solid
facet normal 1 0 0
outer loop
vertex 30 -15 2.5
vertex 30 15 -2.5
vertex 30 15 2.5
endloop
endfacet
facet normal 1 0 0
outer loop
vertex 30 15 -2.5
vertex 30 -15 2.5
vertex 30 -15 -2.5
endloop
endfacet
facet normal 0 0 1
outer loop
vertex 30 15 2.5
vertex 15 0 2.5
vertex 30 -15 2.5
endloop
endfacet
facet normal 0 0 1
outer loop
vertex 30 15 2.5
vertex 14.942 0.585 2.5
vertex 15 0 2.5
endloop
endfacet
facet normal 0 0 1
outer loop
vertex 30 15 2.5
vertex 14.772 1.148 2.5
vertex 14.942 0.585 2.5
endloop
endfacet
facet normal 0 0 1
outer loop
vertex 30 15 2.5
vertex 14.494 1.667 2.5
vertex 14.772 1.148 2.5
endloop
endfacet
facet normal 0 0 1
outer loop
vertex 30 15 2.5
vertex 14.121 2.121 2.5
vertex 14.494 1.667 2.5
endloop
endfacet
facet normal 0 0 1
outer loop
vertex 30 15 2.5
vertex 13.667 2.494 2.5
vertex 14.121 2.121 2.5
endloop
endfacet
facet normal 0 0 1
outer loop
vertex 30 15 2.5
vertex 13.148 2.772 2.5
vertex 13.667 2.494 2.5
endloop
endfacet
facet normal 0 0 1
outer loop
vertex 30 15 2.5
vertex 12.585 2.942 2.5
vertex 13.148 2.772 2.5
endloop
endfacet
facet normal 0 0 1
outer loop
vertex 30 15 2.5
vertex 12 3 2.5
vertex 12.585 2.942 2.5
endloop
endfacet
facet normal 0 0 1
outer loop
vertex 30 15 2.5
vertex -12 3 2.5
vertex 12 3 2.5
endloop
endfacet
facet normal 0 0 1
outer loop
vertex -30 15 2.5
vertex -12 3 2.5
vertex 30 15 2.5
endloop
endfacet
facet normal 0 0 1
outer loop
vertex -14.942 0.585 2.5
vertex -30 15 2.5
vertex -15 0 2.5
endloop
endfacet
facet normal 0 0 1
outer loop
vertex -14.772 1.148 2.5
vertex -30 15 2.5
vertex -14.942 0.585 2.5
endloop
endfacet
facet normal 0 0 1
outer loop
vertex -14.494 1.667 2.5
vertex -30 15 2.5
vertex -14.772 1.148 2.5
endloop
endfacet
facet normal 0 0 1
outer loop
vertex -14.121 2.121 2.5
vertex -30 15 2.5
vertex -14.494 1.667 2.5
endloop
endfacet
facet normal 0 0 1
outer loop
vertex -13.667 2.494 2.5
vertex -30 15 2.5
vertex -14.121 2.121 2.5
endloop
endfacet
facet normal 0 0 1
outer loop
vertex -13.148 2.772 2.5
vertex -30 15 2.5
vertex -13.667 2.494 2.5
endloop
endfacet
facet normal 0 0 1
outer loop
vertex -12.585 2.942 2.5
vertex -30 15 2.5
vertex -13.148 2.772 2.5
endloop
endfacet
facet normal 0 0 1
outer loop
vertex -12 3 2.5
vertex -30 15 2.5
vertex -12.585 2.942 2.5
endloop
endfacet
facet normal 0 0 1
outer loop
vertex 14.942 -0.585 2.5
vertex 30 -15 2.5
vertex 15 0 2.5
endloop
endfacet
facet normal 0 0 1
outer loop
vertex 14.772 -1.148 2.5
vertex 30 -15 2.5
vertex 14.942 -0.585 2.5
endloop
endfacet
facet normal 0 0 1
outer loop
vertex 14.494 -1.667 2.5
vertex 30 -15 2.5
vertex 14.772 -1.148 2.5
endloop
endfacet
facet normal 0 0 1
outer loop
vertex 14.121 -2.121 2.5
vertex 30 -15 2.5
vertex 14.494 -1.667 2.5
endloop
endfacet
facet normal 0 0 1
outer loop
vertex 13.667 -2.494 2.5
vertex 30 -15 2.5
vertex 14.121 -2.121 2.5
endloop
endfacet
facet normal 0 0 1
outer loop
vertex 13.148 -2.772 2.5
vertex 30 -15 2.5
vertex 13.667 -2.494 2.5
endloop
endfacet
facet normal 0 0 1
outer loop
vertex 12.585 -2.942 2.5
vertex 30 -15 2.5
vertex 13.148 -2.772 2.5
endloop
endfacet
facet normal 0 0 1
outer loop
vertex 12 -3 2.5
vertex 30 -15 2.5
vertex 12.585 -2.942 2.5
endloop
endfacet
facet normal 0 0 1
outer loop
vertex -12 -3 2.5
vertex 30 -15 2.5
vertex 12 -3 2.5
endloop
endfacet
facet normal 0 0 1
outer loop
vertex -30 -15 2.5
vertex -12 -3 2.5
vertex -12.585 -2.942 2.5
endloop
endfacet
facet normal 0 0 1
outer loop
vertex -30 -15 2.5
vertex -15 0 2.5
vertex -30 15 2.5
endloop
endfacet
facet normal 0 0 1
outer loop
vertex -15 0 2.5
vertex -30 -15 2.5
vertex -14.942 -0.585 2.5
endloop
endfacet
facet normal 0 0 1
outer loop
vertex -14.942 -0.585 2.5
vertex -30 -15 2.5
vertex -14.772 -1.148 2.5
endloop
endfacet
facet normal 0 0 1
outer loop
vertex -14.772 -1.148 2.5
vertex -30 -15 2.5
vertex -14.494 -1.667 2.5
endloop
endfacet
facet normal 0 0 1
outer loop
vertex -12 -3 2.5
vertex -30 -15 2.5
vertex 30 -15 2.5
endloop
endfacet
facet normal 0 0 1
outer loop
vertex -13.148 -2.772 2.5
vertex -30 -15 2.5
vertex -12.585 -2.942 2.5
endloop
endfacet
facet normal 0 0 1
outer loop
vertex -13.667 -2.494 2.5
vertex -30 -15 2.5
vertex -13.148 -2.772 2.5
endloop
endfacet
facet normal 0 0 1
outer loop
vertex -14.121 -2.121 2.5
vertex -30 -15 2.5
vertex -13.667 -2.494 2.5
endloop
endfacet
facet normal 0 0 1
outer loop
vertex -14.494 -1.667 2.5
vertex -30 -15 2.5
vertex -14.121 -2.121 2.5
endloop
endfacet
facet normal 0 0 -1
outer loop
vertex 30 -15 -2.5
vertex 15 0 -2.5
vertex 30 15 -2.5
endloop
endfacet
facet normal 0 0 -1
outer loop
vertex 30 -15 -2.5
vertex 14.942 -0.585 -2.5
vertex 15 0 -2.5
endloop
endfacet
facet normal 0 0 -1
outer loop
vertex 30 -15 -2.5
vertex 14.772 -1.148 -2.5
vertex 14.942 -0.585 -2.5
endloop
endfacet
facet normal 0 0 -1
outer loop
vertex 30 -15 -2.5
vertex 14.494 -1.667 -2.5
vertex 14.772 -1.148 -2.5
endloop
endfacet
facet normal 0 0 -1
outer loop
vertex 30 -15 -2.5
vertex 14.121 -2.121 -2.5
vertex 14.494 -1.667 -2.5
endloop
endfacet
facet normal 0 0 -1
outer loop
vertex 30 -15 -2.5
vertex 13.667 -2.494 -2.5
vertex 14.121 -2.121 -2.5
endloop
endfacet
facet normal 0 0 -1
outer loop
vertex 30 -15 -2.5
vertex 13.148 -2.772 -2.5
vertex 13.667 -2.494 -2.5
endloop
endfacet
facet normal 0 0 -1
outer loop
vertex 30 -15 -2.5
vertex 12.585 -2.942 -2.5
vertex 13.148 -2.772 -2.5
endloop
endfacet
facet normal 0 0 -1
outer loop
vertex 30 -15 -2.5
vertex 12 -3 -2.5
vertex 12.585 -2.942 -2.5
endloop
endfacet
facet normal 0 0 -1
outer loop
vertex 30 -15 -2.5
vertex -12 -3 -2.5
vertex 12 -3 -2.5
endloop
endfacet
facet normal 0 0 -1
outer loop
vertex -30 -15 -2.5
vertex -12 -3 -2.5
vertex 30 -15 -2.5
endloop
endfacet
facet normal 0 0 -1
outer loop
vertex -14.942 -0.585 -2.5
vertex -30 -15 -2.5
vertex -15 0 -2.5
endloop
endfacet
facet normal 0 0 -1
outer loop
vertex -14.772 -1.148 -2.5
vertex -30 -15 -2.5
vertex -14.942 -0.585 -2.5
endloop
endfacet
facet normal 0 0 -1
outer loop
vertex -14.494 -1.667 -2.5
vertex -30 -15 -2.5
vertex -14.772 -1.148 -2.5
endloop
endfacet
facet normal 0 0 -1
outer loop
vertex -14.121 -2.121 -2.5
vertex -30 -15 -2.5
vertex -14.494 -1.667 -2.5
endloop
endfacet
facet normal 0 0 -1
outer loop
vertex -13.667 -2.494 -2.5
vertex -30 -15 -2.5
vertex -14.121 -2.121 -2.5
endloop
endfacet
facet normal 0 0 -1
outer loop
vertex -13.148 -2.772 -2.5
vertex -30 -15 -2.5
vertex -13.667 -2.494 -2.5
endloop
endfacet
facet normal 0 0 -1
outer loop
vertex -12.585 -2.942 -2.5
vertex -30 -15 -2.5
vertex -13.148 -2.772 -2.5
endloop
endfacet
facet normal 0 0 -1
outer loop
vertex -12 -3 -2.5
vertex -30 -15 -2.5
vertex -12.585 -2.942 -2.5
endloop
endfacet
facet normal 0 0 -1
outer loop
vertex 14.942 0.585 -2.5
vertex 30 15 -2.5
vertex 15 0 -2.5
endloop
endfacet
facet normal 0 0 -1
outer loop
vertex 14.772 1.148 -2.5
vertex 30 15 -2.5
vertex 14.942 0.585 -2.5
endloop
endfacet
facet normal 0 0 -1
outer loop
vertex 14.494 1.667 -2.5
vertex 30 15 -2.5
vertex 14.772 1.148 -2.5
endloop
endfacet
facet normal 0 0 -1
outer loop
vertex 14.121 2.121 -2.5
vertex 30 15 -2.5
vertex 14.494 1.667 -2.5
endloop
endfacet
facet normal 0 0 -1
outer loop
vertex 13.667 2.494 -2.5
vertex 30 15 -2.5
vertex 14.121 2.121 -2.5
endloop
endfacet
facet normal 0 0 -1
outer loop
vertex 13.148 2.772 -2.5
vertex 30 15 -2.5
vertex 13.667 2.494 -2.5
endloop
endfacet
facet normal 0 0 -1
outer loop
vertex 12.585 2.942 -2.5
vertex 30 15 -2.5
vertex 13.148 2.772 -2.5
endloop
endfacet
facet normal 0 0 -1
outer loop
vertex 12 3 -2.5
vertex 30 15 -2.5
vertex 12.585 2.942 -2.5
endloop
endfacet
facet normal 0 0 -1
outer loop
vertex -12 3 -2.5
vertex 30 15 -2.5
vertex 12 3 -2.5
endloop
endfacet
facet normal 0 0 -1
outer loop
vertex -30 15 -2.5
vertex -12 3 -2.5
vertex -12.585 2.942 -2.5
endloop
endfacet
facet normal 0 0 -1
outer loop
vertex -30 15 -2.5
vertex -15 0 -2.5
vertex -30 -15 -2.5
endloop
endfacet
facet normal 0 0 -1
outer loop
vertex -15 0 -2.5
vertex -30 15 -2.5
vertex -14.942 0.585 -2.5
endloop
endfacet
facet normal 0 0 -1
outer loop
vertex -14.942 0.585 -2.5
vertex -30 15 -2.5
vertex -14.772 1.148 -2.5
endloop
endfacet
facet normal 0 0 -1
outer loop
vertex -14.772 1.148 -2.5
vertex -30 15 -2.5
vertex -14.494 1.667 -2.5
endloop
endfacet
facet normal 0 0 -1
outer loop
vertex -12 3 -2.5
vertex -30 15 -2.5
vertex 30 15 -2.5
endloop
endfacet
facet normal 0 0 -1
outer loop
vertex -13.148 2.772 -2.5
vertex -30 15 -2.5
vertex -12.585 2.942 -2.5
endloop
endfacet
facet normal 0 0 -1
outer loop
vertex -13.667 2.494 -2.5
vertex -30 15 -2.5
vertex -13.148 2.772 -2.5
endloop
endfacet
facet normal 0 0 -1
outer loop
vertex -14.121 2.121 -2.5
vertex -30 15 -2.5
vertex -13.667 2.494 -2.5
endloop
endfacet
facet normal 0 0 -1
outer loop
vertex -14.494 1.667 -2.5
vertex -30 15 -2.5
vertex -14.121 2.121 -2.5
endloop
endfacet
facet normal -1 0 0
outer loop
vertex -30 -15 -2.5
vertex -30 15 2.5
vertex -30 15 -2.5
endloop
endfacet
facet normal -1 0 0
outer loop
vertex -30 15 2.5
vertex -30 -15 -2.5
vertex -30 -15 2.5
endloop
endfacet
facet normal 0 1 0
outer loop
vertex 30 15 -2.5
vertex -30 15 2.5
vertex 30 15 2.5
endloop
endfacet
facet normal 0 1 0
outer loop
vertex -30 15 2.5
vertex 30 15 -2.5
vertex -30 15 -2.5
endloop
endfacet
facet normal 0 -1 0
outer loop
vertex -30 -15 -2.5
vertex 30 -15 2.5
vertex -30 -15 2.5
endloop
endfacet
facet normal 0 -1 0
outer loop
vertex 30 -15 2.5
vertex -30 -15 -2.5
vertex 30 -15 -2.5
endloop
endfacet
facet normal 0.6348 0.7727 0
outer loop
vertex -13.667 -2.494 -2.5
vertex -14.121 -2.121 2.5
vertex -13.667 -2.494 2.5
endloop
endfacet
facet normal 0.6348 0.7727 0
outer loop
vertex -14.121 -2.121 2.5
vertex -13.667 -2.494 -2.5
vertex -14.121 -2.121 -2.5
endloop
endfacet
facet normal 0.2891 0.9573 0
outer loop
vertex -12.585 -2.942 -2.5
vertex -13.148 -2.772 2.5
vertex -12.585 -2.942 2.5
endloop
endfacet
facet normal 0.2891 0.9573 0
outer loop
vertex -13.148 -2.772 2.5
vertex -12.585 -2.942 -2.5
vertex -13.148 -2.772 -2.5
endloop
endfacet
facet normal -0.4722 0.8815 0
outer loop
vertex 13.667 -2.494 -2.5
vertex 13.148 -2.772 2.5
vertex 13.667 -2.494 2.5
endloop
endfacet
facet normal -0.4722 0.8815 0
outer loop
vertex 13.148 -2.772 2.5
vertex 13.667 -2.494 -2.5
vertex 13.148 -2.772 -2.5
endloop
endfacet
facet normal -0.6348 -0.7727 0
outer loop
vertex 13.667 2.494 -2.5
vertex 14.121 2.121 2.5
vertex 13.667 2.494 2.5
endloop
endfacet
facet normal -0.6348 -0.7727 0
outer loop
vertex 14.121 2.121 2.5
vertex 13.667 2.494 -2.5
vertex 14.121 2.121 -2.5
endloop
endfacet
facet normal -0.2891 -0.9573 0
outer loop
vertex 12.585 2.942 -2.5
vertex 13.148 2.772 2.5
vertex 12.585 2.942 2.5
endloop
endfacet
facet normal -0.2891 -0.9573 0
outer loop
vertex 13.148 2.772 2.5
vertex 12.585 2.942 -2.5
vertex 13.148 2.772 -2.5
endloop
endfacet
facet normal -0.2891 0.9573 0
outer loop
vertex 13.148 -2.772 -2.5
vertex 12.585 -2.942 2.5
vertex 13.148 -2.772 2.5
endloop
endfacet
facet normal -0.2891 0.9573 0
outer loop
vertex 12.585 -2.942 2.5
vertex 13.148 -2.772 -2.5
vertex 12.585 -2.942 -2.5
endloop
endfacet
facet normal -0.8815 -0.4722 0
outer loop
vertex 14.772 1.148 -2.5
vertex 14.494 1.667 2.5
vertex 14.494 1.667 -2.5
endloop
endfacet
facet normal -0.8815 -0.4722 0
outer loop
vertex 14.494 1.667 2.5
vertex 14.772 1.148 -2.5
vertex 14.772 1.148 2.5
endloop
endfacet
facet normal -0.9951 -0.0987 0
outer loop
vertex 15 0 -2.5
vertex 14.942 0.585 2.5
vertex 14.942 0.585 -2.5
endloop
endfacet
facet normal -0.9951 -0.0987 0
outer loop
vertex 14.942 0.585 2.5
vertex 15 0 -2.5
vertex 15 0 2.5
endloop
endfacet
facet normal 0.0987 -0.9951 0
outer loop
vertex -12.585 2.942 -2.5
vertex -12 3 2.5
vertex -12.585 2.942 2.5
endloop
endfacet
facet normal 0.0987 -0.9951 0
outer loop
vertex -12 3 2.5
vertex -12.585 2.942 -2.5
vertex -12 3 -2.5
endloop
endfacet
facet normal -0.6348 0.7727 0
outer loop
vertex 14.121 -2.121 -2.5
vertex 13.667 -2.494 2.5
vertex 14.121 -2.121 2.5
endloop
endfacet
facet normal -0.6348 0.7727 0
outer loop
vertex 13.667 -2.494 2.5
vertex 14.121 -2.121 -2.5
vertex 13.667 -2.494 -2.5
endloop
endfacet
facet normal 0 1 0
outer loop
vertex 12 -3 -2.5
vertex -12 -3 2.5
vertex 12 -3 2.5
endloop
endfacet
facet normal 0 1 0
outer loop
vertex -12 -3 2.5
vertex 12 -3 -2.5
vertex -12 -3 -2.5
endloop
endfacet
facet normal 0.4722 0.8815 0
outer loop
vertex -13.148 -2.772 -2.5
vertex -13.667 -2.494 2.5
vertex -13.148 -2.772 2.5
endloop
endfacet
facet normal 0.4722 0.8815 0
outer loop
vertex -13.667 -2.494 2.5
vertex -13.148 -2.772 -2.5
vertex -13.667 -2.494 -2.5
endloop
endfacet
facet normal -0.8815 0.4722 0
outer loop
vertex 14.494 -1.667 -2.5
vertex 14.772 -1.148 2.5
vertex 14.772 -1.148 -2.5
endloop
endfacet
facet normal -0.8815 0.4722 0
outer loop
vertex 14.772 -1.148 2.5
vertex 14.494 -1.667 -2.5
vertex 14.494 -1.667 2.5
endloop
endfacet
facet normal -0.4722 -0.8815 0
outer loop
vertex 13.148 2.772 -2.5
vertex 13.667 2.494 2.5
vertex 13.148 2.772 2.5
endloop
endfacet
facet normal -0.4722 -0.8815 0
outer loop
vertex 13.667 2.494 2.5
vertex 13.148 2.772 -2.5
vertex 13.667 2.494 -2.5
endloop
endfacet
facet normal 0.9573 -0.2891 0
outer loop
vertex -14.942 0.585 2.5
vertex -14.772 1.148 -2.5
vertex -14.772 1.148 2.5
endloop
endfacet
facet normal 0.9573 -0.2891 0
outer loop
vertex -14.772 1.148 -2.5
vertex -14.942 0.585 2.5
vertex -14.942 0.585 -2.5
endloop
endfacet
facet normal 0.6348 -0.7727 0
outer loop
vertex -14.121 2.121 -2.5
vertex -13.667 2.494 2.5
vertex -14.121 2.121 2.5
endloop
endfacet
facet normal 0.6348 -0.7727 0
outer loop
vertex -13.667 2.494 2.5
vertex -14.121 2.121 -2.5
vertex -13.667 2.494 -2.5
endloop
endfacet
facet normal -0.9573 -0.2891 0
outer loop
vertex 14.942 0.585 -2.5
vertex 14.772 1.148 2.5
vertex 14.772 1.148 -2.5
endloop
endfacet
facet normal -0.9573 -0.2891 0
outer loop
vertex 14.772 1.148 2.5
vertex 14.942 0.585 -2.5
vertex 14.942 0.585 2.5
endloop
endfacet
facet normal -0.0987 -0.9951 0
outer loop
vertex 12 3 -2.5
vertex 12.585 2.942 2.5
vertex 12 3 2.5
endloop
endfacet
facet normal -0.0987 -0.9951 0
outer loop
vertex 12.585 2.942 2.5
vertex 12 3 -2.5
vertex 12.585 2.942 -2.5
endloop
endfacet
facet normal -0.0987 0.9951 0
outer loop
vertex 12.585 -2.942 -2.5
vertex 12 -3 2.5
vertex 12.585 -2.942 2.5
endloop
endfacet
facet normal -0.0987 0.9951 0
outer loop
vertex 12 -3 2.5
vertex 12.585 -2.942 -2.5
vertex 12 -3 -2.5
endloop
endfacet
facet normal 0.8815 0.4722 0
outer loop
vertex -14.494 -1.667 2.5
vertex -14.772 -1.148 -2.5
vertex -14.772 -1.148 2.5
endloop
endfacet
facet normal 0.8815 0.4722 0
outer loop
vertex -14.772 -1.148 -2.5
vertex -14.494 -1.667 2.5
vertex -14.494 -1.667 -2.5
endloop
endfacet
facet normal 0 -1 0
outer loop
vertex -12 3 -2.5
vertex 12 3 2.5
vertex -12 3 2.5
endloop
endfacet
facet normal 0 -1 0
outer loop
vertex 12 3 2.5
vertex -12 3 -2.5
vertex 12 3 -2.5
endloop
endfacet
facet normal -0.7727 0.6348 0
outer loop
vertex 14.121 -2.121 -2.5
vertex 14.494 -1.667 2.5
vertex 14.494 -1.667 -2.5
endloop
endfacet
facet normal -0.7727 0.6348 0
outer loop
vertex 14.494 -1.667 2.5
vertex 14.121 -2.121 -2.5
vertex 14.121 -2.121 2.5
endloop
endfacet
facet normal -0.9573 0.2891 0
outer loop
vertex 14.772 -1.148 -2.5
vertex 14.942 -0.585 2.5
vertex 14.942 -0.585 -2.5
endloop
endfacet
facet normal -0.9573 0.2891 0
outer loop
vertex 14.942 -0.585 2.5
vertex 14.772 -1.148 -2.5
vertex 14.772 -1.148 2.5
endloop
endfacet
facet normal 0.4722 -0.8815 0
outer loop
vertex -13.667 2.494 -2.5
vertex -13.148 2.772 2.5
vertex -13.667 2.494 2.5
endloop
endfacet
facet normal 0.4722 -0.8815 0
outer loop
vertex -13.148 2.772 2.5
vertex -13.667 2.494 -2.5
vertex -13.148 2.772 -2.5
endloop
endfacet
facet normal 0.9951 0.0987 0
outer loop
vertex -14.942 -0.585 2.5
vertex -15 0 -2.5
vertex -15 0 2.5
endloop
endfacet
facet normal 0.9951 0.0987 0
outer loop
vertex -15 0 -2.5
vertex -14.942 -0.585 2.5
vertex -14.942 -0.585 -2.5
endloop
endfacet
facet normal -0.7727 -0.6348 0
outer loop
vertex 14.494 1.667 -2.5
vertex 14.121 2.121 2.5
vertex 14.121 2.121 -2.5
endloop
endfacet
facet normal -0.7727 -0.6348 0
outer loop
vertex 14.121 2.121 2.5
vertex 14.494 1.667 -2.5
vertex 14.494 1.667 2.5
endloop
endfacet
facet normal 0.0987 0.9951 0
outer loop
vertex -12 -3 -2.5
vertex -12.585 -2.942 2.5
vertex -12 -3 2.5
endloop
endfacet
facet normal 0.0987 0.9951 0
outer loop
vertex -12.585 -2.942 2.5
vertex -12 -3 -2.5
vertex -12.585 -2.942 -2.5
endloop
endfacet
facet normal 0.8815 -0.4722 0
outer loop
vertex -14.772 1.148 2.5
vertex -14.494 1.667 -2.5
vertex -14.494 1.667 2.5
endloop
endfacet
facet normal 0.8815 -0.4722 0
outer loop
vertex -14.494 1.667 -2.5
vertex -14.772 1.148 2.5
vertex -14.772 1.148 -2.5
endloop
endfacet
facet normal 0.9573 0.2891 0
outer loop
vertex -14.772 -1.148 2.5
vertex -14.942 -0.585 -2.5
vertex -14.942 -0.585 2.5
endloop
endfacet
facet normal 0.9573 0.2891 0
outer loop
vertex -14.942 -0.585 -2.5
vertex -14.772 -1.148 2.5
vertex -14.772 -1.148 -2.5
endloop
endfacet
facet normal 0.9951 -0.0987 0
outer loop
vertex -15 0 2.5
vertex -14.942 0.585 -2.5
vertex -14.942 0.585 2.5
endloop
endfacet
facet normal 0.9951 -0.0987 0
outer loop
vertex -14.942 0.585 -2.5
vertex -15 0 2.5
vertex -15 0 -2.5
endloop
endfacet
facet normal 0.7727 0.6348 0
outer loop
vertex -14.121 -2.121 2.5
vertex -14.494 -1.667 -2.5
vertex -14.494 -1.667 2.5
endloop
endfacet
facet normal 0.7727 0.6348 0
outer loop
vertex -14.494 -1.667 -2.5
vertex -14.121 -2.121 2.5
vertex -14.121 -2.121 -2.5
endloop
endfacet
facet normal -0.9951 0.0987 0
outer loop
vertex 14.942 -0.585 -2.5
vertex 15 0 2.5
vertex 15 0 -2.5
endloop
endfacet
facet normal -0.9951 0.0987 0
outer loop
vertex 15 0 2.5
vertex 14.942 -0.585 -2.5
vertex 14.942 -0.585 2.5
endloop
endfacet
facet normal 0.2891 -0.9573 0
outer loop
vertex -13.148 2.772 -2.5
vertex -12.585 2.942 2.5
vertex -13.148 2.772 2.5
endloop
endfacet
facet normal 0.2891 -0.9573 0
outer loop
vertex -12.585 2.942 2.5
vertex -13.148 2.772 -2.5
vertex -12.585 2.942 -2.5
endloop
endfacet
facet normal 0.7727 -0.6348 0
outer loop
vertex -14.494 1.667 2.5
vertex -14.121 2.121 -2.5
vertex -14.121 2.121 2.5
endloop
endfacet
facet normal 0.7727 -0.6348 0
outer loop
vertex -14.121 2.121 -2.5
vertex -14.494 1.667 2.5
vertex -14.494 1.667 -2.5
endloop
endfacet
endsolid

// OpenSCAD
module slot(length = 20, diameter = 5, height = 10) {
    hull() {
        translate([-length / 2 + diameter / 2, 0, 0])
            cylinder(h = height, d = diameter, center = true, $fn = 32);

        translate([length / 2 - diameter / 2, 0, 0])
            cylinder(h = height, d = diameter, center = true, $fn = 32);
    }
}

difference() {
    cube([60, 30, 5], center = true);

    slot(length = 30, diameter = 6, height = 7);
}
